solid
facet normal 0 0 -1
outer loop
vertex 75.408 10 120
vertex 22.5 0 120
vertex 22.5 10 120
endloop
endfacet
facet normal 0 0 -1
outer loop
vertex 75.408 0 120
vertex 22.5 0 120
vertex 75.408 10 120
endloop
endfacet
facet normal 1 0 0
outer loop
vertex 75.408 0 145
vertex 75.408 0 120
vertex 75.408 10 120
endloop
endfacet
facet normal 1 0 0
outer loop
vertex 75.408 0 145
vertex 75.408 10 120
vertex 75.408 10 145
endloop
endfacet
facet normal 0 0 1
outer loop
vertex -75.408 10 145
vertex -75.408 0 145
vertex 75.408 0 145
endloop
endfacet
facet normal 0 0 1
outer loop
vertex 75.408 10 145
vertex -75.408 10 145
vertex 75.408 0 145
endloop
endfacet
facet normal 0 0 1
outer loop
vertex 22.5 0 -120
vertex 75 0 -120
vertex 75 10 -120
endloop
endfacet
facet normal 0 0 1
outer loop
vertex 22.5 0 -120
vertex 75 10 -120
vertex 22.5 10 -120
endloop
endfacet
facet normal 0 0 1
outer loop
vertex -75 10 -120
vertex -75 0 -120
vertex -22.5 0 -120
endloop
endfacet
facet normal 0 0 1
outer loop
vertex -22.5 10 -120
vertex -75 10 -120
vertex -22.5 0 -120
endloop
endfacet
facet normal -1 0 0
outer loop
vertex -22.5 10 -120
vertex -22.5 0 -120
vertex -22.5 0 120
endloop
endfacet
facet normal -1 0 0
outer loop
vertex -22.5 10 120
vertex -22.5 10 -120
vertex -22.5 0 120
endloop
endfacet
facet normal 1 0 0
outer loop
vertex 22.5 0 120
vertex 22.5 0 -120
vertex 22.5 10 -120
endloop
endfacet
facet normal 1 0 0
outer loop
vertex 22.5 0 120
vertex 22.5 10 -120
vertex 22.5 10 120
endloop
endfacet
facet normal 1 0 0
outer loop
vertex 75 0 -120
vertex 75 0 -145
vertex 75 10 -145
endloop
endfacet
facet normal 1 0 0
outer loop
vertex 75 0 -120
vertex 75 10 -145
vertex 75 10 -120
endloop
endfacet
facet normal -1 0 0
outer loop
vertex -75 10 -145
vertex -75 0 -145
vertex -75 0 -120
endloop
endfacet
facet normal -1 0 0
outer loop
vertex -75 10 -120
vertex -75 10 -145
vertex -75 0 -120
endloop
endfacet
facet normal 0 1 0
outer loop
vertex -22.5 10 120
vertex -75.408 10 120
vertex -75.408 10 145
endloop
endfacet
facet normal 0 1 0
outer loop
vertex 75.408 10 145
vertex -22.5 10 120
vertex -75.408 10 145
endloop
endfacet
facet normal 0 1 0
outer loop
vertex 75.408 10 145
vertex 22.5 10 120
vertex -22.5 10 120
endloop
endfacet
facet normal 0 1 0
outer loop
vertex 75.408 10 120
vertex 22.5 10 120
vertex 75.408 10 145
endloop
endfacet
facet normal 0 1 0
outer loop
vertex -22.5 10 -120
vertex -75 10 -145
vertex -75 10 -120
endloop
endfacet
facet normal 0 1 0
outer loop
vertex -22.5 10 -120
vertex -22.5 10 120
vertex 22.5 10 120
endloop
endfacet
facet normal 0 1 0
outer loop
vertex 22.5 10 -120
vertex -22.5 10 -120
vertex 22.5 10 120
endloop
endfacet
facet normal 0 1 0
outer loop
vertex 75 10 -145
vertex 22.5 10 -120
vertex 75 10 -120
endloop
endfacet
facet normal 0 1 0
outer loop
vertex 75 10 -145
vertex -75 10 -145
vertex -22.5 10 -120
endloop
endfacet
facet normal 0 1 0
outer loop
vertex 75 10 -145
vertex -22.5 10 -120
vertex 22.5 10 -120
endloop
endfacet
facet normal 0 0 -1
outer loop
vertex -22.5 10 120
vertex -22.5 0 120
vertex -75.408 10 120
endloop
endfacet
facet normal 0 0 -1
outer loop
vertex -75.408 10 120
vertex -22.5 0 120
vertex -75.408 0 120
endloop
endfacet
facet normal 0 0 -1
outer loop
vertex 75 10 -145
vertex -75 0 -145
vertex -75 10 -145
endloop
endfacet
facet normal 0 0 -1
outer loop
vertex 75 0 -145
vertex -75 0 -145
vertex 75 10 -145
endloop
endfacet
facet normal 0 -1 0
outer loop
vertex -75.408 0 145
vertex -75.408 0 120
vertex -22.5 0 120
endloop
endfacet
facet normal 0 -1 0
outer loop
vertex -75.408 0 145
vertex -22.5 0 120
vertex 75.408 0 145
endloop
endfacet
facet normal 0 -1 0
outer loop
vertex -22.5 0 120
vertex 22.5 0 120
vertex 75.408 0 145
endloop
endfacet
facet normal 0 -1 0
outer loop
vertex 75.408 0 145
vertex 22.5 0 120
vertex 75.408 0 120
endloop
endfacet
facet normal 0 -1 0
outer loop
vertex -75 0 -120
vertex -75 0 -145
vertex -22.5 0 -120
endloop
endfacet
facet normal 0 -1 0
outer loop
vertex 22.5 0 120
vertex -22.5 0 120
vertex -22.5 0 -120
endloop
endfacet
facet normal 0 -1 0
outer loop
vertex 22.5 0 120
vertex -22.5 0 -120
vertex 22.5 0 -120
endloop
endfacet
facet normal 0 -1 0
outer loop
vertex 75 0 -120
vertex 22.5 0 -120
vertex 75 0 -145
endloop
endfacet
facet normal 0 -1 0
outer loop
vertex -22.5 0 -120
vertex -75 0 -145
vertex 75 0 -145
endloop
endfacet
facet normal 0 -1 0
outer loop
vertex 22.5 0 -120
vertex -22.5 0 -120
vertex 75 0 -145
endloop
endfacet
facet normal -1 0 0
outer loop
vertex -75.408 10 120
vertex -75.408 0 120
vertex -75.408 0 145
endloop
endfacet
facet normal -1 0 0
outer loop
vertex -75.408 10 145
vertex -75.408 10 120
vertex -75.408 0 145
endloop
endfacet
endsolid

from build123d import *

# Parameters (mm, degrees)
SKETCH1_W           = 310
SKETCH1_H           = 290
BOSS_EXTRUDE1_DEPTH = 10
CUT_EXTRUDE1_DEPTH  = 213.485293609
CUT_EXTRUDE2_DEPTH  = 186.337530006


with BuildPart() as part:
    # Sketch1 → Boss-Extrude1 (new body)
    with BuildSketch(Plane(origin=(0, 0, 0), x_dir=(1, 0, 0), z_dir=(0, 1, 0))):
        Rectangle(SKETCH1_W, SKETCH1_H)
    extrude(amount=BOSS_EXTRUDE1_DEPTH)

    # Sketch2 → Cut-Extrude1 (cut, through all)
    with BuildSketch(Plane(origin=(0, 10, 0), x_dir=(1, 0, 0), z_dir=(0, 1, 0))):
        Polygon((-85.000000124, 145), (-115.000000124, 87.499999968), (-115.000000124, -87.500000032), (-85, -145), (-155, -145), (-155.000000124, 144.999999996), align=None)
        Polygon((155, -145), (155.000000124, 144.999999996), (85.000000124, 145), (115.000000124, 87.499999968), (115.000000124, -87.500000032), (85, -145), align=None)
    extrude(amount=-CUT_EXTRUDE1_DEPTH, mode=Mode.SUBTRACT)

    # Sketch3 → Cut-Extrude2 (cut, through all)
    with BuildSketch(Plane.XZ):
        Polygon((-75.000000124, -145), (-75.000000124, -120), (-22.500000124, -120), (-22.500000124, 120), (-75.407979447, 120), (-75.407979447, 145), (-85, 145), (-115.000000124, 87.500000032), (-115.000000124, -87.499999968), (-85.000000124, -145), align=None)
        Polygon((75.000000124, -120), (22.500000124, -120), (22.500000124, 120), (75.407979447, 120), (75.407979447, 145), (85, 145), (115.000000124, 87.500000032), (115.000000124, -87.499999968), (85.000000124, -145), (75.000000124, -145), align=None)
    extrude(amount=-CUT_EXTRUDE2_DEPTH, mode=Mode.SUBTRACT)


solid = part.part
